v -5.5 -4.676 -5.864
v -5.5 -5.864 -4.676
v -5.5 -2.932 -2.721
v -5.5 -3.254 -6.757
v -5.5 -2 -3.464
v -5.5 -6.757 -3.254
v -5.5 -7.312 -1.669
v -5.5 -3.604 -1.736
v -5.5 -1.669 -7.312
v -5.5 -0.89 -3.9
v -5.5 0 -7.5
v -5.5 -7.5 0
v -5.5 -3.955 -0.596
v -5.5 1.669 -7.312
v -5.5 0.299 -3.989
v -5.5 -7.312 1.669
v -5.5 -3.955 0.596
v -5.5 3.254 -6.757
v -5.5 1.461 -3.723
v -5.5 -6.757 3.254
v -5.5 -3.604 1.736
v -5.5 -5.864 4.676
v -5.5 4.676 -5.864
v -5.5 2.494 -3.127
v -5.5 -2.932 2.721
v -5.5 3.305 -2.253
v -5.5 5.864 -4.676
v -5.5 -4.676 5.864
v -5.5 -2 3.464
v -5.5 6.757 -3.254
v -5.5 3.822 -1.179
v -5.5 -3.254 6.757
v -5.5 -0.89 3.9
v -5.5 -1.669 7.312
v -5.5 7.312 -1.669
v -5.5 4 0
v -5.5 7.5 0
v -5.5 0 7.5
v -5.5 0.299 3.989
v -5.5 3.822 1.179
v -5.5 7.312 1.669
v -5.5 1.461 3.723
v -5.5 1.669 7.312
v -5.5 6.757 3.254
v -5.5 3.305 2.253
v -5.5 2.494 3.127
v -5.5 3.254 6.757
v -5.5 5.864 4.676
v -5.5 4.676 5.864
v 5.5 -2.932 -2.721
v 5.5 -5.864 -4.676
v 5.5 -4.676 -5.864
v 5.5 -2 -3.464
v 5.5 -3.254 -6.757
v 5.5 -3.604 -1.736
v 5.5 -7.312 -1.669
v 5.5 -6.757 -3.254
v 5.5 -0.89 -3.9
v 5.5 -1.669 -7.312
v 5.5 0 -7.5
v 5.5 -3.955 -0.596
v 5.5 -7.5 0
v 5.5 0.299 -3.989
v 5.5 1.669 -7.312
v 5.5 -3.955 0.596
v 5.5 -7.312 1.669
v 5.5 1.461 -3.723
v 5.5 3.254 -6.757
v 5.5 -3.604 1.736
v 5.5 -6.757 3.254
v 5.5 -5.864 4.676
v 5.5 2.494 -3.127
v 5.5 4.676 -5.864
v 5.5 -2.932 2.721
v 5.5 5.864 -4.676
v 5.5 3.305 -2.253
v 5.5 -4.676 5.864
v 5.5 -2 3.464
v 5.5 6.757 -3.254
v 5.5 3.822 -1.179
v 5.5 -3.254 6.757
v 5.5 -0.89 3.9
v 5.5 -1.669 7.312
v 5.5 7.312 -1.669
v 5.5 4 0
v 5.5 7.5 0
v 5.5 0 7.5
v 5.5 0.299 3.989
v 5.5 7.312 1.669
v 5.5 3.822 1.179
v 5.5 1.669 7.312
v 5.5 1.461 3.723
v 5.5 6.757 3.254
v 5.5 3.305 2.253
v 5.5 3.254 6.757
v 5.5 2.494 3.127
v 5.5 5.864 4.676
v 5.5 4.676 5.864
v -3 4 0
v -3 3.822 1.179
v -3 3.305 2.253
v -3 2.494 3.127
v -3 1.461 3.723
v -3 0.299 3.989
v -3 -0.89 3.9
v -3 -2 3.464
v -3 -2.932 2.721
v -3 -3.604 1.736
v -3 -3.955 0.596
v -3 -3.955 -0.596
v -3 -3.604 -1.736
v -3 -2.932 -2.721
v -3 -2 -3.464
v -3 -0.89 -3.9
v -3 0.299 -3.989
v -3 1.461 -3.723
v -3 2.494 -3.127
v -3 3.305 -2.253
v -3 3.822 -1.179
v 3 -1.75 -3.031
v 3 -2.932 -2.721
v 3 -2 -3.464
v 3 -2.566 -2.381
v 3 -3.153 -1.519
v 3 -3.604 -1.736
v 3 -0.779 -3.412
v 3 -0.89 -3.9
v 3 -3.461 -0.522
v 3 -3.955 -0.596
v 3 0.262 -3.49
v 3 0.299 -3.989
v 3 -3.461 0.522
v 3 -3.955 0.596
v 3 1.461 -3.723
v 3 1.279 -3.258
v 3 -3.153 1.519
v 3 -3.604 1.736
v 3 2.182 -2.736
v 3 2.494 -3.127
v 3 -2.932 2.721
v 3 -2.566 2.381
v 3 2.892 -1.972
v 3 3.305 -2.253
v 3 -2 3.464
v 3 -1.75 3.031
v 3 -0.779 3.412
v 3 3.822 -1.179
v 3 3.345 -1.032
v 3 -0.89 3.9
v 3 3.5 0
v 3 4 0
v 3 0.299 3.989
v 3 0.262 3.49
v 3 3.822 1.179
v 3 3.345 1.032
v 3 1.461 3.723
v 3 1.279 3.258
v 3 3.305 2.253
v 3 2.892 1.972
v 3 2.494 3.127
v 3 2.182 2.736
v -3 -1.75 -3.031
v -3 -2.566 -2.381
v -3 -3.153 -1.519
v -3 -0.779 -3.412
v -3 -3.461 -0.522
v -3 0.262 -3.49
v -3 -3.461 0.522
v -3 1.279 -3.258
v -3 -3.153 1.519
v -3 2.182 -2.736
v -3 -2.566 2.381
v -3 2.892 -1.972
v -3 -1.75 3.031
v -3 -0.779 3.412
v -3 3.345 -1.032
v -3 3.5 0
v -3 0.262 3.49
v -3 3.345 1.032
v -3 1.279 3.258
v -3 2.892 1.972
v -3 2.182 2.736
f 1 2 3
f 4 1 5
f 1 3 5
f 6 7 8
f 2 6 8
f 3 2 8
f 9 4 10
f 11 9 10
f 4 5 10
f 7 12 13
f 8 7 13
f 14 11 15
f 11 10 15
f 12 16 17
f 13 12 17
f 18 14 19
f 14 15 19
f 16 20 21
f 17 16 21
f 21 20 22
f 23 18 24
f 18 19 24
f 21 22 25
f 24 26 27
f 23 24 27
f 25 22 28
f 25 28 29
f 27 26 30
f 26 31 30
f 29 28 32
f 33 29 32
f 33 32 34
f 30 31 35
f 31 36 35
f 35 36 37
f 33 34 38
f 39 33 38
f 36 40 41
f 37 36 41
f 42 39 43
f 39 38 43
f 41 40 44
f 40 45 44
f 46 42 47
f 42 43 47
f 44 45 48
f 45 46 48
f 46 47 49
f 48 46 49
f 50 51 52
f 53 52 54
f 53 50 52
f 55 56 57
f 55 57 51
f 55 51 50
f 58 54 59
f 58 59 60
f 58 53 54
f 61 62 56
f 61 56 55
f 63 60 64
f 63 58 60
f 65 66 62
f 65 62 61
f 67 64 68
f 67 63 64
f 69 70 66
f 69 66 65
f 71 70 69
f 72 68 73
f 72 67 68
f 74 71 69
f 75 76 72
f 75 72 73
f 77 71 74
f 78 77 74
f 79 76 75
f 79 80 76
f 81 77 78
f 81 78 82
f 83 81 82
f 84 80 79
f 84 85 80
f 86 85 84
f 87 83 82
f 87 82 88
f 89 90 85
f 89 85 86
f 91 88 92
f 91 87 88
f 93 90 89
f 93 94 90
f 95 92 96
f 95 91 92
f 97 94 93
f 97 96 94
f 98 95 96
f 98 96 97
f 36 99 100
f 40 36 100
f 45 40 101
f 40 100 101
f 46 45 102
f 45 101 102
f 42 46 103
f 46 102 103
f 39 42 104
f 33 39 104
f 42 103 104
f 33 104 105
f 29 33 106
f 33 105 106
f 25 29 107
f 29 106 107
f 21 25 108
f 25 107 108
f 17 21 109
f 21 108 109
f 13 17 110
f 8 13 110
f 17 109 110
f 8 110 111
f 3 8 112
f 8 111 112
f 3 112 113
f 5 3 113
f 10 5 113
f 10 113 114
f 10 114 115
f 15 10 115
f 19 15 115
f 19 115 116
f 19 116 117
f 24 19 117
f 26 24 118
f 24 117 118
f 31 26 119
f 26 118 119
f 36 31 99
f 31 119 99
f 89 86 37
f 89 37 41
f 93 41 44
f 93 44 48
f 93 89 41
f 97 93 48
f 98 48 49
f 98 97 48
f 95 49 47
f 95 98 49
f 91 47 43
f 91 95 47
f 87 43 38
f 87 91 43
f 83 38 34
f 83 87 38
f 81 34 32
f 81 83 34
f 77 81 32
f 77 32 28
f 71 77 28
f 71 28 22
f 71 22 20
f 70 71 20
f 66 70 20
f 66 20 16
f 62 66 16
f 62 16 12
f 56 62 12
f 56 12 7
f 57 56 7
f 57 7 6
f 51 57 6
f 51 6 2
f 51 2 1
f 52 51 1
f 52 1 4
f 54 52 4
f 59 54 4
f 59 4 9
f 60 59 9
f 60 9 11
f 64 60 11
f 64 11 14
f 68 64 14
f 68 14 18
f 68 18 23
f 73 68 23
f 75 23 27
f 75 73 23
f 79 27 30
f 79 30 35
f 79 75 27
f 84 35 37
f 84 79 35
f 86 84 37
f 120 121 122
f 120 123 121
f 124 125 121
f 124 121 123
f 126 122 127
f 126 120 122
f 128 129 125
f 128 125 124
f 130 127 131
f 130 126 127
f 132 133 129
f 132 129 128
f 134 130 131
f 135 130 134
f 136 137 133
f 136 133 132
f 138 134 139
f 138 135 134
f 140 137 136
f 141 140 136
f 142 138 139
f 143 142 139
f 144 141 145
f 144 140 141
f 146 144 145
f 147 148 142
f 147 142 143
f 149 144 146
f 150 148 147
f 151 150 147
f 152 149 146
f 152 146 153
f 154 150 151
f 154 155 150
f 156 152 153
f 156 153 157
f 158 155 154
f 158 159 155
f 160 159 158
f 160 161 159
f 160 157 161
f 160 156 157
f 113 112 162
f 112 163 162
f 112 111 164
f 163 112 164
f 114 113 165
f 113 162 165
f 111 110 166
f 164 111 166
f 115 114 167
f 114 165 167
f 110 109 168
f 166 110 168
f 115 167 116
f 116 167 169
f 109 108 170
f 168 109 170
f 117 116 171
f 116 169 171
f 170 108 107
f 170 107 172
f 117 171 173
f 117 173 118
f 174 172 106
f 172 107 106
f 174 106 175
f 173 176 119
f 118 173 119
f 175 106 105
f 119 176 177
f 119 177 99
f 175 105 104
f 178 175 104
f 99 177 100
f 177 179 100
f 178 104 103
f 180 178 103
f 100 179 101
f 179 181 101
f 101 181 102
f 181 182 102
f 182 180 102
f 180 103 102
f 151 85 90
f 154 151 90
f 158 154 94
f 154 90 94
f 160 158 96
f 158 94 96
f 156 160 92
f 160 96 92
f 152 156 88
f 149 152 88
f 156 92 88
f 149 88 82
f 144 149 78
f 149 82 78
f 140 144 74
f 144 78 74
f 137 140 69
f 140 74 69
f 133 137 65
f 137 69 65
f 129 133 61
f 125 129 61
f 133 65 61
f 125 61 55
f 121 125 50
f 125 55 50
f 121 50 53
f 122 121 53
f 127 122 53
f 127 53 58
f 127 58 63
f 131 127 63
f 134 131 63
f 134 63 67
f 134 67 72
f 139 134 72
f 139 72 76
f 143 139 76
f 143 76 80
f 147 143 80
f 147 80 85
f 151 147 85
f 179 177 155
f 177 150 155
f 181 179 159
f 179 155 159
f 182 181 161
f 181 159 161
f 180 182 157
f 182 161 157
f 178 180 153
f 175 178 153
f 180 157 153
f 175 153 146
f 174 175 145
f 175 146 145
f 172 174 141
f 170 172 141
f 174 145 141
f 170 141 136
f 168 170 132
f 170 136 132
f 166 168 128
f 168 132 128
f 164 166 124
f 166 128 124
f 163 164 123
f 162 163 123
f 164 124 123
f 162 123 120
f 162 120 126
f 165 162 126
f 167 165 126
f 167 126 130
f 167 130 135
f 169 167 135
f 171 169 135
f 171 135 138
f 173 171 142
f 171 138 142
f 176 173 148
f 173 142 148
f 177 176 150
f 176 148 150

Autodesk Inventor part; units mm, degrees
sketch "_____1" plane through (0, 0, 0) normal (0, 0, 1) x (1, 0, 0)
  line L0 (5.5, 0) -> (-5.5, 0)
  line L1 (-5.5, 0) -> (-5.5, 7.5)
  line L2 (-5.5, 7.5) -> (5.5, 7.5)
  line L3 (5.5, 7.5) -> (5.5, 0)
  line L4 (5.5, 0) -> (-5.5, 0)
revolve "Revolution1" add sketch "_____1" angle 360 about axis through (5.5, 0, 0) along (1, 0, 0)
sketch "_____3" plane through (0, 0, 0) normal (0, 0, 1) x (1, 0, 0)
  line L0 (5.5, 0) -> (-5.5, 0)
  line L1 (-5.5, 0) -> (-5.5, 4)
  line L2 (-5.5, 4) -> (-3, 4)
  line L3 (-3, 4) -> (-3, 3.5)
  line L4 (-3, 3.5) -> (3, 3.5)
  line L5 (3, 3.5) -> (3, 4)
  line L6 (3, 4) -> (5.5, 4)
  line L7 (5.5, 4) -> (5.5, 0)
  line L8 (5.5, 0) -> (-5.5, 0)
revolve "Revolution2" cut sketch "_____3" angle 360 about axis through (5.5, 0, 0) along (1, 0, 0)
ref_plane "b600_1_XY" through (4.25, 0, 0) normal (1, 0, 0) x (0, 0, -1)
ref_plane "b600_1_YZ" through (4.25, 0, 0) normal (0, 0, -1) x (0, 1, 0)
ref_plane "b600_1_ZX" through (4.25, 0, 0) normal (0, 1, 0) x (1, 0, 0)
ref_plane "b600_2_XY" through (-4.25, 0, 0) normal (1, 0, 0) x (0, 0, -1)
ref_plane "b600_2_YZ" through (-4.25, 0, 0) normal (0, 0, -1) x (0, 1, 0)
ref_plane "b600_2_ZX" through (-4.25, 0, 0) normal (0, 1, 0) x (1, 0, 0)
ref_plane "to_dummy_XY" through (0, 0, 0) normal (1, 0, 0) x (0, 0, -1)
ref_plane "to_dummy_YZ" through (0, 0, 0) normal (0, 0, -1) x (0, 1, 0)
ref_plane "to_dummy_ZX" through (0, 0, 0) normal (0, 1, 0) x (1, 0, 0)
properties part number "C-AFBD11-15_bw"
